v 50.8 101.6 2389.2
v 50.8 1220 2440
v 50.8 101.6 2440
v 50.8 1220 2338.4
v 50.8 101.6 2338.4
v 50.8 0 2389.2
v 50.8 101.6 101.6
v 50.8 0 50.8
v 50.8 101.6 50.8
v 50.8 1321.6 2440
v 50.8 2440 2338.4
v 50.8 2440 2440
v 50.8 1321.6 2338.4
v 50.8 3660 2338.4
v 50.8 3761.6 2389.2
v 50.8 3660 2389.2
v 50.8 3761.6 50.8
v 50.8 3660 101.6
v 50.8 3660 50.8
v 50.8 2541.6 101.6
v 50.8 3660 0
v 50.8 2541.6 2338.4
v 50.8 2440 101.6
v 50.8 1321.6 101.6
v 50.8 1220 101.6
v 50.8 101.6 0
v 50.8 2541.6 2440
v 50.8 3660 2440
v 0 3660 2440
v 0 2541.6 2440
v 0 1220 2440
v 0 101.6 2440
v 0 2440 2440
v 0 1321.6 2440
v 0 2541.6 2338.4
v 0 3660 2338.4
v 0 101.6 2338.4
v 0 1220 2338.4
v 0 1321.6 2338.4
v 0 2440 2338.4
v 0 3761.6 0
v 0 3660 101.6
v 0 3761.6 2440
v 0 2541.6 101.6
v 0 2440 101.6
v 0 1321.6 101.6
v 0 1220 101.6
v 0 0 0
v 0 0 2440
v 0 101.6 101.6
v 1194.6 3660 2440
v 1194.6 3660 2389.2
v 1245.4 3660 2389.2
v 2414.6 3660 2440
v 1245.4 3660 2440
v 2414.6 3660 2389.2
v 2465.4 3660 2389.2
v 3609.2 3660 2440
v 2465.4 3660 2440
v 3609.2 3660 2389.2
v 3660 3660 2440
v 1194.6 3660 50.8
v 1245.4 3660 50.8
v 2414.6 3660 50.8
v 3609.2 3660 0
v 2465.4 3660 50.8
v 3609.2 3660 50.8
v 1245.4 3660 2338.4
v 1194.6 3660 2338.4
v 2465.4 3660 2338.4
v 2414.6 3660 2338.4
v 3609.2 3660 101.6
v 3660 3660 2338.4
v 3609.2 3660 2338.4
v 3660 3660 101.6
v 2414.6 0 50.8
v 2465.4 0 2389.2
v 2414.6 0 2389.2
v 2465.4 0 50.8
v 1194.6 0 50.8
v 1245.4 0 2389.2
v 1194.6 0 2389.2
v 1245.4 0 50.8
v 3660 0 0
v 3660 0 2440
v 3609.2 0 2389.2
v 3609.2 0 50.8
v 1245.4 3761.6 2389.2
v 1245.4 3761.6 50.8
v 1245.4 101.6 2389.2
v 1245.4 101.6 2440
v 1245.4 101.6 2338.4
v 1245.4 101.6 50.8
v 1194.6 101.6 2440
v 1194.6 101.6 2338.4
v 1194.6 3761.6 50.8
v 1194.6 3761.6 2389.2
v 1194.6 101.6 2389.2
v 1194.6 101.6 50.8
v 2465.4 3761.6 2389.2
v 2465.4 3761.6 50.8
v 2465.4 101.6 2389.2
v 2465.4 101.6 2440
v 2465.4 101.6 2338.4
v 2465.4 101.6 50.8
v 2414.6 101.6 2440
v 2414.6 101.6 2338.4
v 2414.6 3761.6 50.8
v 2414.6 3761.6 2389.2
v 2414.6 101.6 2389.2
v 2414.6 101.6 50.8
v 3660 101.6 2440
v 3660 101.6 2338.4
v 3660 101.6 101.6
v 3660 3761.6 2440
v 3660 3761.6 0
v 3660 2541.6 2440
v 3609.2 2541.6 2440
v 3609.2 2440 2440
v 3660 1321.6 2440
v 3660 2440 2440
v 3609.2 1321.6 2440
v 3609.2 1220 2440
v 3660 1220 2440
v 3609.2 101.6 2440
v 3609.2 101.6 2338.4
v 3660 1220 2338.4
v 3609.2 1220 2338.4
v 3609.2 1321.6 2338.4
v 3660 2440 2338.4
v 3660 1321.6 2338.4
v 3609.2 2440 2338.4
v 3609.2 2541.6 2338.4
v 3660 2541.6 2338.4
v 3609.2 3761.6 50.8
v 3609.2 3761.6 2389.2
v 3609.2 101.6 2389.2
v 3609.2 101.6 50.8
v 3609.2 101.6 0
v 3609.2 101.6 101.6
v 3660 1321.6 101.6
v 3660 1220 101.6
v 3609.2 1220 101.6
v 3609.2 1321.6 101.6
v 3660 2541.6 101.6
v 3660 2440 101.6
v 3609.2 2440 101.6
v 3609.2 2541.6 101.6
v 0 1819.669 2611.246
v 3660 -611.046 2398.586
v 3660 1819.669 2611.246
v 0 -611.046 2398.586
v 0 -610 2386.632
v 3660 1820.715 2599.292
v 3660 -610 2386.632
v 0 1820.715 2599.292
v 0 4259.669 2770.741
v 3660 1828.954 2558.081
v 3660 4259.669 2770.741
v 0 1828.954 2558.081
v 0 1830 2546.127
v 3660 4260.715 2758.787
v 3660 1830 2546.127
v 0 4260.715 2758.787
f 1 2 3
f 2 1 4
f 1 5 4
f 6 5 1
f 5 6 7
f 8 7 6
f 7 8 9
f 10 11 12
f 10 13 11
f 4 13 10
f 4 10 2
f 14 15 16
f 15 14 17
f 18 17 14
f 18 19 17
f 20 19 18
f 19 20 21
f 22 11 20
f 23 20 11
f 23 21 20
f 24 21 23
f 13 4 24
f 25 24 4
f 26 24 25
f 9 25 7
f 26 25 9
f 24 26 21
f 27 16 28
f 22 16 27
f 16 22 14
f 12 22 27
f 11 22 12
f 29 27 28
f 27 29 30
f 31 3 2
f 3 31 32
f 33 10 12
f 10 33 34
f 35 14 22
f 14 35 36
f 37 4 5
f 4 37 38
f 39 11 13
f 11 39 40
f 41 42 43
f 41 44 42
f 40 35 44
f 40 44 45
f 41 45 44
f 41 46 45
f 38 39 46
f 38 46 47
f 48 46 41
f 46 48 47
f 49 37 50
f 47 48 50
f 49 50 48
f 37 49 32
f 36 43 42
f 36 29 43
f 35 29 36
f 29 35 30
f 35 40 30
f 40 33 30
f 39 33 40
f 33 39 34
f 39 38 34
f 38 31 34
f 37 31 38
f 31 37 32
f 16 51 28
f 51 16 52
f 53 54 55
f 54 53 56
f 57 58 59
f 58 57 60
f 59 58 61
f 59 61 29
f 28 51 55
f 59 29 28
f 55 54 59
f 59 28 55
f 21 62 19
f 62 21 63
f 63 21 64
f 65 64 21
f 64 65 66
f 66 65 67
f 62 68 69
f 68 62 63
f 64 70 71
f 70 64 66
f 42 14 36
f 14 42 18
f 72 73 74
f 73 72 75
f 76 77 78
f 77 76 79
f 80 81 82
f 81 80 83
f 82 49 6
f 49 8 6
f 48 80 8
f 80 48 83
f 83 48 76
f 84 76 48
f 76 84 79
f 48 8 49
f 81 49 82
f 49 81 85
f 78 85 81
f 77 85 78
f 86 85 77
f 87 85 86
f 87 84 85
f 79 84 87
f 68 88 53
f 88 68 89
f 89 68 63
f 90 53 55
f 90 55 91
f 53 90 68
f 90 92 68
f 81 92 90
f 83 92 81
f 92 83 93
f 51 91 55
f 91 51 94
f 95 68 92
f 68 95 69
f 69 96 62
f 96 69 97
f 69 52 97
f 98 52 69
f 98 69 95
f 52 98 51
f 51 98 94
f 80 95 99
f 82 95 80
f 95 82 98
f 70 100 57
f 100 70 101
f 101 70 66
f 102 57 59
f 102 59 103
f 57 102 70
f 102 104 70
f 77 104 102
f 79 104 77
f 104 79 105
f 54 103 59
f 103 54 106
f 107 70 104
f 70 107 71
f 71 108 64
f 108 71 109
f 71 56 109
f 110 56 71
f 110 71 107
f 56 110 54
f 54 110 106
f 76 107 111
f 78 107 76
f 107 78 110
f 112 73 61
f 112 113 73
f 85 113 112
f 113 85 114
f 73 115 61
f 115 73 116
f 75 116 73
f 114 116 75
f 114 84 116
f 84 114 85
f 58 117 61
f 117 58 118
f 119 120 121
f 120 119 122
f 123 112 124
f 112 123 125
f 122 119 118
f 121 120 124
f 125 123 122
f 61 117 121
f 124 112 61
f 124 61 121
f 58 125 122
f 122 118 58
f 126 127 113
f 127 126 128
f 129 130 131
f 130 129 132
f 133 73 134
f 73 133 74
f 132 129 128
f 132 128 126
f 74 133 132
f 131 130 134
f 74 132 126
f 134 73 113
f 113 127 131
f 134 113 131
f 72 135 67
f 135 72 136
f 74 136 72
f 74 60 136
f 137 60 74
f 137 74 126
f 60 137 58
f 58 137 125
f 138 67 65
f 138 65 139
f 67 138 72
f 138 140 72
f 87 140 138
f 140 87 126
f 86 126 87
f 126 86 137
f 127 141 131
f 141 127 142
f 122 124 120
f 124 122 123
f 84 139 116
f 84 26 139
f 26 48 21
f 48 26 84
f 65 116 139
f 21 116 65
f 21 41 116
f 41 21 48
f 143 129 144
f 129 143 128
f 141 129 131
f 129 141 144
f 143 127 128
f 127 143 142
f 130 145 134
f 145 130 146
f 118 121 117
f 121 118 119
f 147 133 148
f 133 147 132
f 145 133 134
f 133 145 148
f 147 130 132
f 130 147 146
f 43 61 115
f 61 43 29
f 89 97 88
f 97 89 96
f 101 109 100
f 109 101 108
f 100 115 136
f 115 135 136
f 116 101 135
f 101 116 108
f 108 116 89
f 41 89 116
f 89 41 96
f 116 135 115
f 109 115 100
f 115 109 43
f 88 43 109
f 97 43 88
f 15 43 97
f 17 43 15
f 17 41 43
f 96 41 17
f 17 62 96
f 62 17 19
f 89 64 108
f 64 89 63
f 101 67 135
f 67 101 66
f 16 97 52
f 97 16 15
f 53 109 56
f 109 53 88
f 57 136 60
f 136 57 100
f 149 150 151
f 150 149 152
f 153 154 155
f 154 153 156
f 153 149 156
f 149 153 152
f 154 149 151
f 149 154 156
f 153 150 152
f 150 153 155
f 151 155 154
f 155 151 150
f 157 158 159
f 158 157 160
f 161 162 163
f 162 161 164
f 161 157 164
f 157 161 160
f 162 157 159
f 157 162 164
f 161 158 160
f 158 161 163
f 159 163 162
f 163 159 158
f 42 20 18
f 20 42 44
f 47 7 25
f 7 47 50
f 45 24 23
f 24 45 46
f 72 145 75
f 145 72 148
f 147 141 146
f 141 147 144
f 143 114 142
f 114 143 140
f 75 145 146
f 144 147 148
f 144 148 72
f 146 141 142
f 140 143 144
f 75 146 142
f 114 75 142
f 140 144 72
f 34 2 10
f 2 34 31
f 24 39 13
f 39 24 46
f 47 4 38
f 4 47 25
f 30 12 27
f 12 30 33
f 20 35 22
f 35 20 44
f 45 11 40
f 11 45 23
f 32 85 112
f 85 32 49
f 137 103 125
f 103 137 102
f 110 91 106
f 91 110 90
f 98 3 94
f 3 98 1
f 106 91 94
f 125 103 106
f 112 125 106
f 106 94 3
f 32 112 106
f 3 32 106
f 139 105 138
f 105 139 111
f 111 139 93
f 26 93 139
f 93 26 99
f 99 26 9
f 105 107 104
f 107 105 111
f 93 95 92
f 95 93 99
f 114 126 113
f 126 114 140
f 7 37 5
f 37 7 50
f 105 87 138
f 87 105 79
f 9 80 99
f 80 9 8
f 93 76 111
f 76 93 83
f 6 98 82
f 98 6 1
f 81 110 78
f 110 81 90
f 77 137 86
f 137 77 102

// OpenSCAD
roof_height = 2440;
roof_angle = 5;
beam_w = 50.8;
beam_d = 101.6;
roof_offset = -610;


// BASE ////////////////

// roof beams

translate([0,0,roof_height - beam_d]) { 
				cube([beam_w,3660,beam_d]); 
				translate([1220 - (beam_w / 2),0,0]){cube([beam_w,3660,beam_d]); }
				translate([2440 - (beam_w / 2),0,0]){cube([beam_w,3660,beam_d]); }
				translate([3660 - beam_w,0,0]){cube([beam_w,3660,beam_d]); }
								}



// Side floor beams

cube([beam_w,3660,beam_d]);
translate([3660 - beam_w,0,0]) {cube([beam_w,3660,beam_d]);}

// side pilars

		translate([0,1220,0]) { cube([beam_w,beam_d,roof_height]);}
		translate([0,2440,0]) { cube([beam_w,beam_d,roof_height]);}

		translate([3660 - beam_w,0,0])
		{
			translate([0,1220,0]) { cube([beam_w,beam_d,roof_height]);}
			translate([0,2440,0]) { cube([beam_w,beam_d,roof_height]);}
		}

// front pilars and beams
	cube([beam_w,beam_d,roof_height]);
	translate([2440 - (beam_w / 2) ,0,0]){cube([beam_w,beam_d,roof_height]);}
	translate([1220 - (beam_w / 2),0,0]) {cube([beam_w,beam_d,roof_height]);}
	translate([3660 - beam_w,0,0]){cube([beam_w,beam_d,roof_height]);}

	cube([3660,beam_d,beam_w]); // Floor beam
	translate([0,0,roof_height - beam_w]){ cube([3660,beam_d,beam_w]); } // roof beam

// back pilars and beams

translate([0,3660,0])
{
	cube([50.8,101.6,roof_height]);
	translate([2440 - (beam_w / 2),0,0]){cube([beam_w,beam_d,roof_height]);}
	translate([1220 - (beam_w / 2),0,0]){cube([beam_w,beam_d,roof_height]);}
	translate([3660 - beam_w,0,0]){cube([beam_w,beam_d,roof_height]);}

	cube([3660,beam_d,beam_w]);
	translate([0,0,roof_height - beam_w]){ cube([3660,beam_d,beam_w]); } // roof beam
}

//Roof

translate([0,roof_offset,roof_height - (-roof_offset * tan(roof_angle))])
{
	rotate([roof_angle,0,0])
	{
		cube([1220,2440,12]);
		translate([1220,0,0]){cube([1220,2440,12]);}
		translate([2440,0,0]){cube([1220,2440,12]);}
	}
}

translate([0,2440 + roof_offset,roof_height + ((2440 + roof_offset) * sin(roof_angle)) - (-roof_offset * tan(roof_angle)) ])
{
	rotate([roof_angle,0,0])
	{
		cube([1220,2440,12]);
		translate([1220,0,0]){cube([1220,2440,12]);}
		translate([2440,0,0]){cube([1220,2440,12]);}
	}
}
